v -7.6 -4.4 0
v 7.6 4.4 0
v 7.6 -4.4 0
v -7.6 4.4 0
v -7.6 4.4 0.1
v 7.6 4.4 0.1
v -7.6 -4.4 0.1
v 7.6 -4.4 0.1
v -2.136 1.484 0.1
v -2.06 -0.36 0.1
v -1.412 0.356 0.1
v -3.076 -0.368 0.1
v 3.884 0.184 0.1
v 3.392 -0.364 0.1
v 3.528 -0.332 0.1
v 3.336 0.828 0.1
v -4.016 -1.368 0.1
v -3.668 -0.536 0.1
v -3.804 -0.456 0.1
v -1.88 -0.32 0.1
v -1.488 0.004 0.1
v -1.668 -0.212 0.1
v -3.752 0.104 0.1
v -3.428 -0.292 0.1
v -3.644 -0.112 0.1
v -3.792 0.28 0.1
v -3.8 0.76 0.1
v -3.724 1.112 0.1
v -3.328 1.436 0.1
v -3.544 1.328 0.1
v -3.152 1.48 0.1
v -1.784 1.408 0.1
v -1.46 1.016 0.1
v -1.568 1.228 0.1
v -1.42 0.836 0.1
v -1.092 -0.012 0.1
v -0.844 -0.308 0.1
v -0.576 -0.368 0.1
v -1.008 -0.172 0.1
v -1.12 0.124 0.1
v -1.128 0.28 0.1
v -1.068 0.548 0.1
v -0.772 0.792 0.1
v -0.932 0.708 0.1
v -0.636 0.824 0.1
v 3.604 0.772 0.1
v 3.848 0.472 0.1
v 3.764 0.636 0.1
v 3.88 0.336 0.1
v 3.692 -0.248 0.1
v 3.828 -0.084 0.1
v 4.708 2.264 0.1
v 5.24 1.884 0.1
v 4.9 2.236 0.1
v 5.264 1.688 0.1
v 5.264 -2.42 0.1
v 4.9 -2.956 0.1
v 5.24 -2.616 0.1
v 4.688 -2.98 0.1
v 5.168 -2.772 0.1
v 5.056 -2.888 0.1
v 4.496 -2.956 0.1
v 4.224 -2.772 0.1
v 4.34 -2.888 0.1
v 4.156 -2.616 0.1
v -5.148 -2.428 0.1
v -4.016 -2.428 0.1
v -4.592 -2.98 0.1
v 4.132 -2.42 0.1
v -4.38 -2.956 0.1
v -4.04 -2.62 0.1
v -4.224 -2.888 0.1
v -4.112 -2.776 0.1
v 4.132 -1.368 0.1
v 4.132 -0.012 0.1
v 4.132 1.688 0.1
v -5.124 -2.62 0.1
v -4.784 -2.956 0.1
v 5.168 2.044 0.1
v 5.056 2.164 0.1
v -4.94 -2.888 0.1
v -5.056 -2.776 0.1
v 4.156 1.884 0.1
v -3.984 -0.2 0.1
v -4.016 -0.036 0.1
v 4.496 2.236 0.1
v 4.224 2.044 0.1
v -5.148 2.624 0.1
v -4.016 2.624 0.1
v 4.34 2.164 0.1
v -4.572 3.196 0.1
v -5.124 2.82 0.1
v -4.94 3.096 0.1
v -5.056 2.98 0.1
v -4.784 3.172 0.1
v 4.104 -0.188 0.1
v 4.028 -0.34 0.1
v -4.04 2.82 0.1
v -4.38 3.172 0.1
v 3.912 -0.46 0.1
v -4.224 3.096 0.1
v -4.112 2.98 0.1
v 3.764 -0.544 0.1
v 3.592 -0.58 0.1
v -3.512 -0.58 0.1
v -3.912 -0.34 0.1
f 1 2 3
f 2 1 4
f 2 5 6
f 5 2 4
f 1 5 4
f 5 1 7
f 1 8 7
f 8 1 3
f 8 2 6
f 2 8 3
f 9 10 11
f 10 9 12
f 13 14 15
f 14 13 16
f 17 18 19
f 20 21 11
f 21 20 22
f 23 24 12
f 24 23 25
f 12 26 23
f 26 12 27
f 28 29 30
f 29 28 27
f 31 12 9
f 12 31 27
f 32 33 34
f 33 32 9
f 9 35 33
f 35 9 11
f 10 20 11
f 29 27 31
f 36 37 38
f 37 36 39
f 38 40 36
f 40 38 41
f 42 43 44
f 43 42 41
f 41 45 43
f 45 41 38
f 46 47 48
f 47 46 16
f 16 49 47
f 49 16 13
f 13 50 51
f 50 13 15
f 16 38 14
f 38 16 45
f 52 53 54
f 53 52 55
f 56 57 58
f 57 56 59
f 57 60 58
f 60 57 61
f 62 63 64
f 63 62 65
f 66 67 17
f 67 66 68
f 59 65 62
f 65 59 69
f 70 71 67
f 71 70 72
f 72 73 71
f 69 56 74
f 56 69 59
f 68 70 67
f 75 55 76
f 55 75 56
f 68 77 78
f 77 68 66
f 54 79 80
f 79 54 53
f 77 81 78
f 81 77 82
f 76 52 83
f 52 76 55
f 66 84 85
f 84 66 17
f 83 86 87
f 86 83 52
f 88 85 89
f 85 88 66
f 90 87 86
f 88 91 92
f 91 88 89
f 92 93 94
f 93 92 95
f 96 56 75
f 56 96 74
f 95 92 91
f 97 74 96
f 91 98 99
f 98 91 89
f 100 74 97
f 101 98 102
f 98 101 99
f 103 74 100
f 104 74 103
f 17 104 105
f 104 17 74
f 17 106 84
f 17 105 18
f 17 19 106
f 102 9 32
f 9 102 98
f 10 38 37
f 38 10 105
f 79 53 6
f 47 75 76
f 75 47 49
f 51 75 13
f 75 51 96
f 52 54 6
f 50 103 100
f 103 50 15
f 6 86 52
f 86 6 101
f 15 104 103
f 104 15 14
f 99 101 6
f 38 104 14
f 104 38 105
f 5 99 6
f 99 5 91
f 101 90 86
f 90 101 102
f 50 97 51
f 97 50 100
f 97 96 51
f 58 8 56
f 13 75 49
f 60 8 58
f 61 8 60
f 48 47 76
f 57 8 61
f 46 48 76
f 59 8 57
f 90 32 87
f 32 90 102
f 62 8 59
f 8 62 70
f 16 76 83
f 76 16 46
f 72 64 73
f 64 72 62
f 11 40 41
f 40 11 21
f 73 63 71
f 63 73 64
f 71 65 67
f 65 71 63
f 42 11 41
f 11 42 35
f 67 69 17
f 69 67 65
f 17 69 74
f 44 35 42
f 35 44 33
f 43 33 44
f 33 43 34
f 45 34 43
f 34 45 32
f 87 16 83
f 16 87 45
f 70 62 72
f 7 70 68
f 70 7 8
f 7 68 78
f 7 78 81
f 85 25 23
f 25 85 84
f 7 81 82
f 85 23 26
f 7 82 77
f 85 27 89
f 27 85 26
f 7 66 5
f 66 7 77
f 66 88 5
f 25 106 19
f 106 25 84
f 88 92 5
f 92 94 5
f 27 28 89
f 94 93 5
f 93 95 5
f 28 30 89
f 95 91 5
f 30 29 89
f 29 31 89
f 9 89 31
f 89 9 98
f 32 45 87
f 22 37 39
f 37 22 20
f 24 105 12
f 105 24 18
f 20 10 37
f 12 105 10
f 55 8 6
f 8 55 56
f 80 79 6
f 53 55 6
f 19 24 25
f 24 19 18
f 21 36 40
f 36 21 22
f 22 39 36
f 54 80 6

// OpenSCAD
// file: ../p/box5-12.scad
use <../lib.scad>
function ldraw_lib__box5_12() = [
// 0 Box with 5 Faces without Any Edges
// 0 Name: box5-12.dat
// 0 Author: Chris Dee [cwdee]
// 0 !LDRAW_ORG Primitive UPDATE 2009-02
// 0 !LICENSE Licensed under CC BY 2.0 and CC BY 4.0 : see CAreadme.txt
// 
// 0 BFC CERTIFY CCW
  [0,"BFC","CERTIFY"],
  [0,"BFC","CCW"],
// 
// 0 !HISTORY 2009-09-03 [PTadmin] Official Update 2009-02
// 
// 
// 4 16 1 1 1 1 1 -1 -1 1 -1 -1 1 1
  [4,16,1,1,1,1,1,-1,-1,1,-1,-1,1,1],
// 4 16 -1 0 1 1 0 1 1 1 1 -1 1 1
  [4,16,-1,0,1,1,0,1,1,1,1,-1,1,1],
// 4 16 -1 0 -1 -1 0 1 -1 1 1 -1 1 -1
  [4,16,-1,0,-1,-1,0,1,-1,1,1,-1,1,-1],
// 4 16 1 0 -1 -1 0 -1 -1 1 -1 1 1 -1
  [4,16,1,0,-1,-1,0,-1,-1,1,-1,1,1,-1],
// 4 16 1 0 1 1 0 -1 1 1 -1 1 1 1
  [4,16,1,0,1,1,0,-1,1,1,-1,1,1,1],
// 0
];
module ldraw_lib__box5_12(step=0, col=false, unit=2/5, alt=false, line=0.2, solid=!$preview)
    makepoly(ldraw_lib__box5_12(), step=step, col=col, unit=unit, alt=alt, line=line, solid=solid);
ldraw_lib__box5_12(line=0.2);
// main file
use <../lib.scad>
use <../p/box5-12.scad>
function ldraw_lib__164565c() = [
// 0 Sticker  1.1 x  1.9 with Blue Bed Icon
// 0 Name: 164565c.dat
// 0 Author: Zoltan Keri [kzoltan82]
// 0 !LDRAW_ORG Part UPDATE 2018-02
// 0 !LICENSE Licensed under CC BY 2.0 and CC BY 4.0 : see CAreadme.txt
// 
// 0 BFC CERTIFY CCW
  [0,"BFC","CERTIFY"],
  [0,"BFC","CCW"],
// 
// 0 !KEYWORDS Hotel, Metroliner, Motel, Set 4558, Train
// 
// 0 !HISTORY 2018-12-08 [PTadmin] Official Update 2018-02
// 
// 
// 1 16 0 -0.25 0 19 0 0 0 0.25 0 0 0 11 box5-12.dat
  [1,16,0,-0.25,0,19,0,0,0,0.25,0,0,0,11, ldraw_lib__box5_12()],
// 4 1 -7.69 -0.25 -0.92 -5.15 -0.25 -0.9 -3.53 -0.25 0.89 -5.34 -0.25 3.71
  [4,1,-7.69,-0.25,-0.92,-5.15,-0.25,-0.9,-3.53,-0.25,0.89,-5.34,-0.25,3.71],
// 4 1 8.82 -0.25 -0.83 9.71 -0.25 0.46 8.34 -0.25 2.07 8.48 -0.25 -0.91
  [4,1,8.82,-0.25,-0.83,9.71,-0.25,0.46,8.34,-0.25,2.07,8.48,-0.25,-0.91],
// 3 1 -10.04 -0.25 -3.42 -9.17 -0.25 -1.34 -9.51 -0.25 -1.14
  [3,1,-10.04,-0.25,-3.42,-9.17,-0.25,-1.34,-9.51,-0.25,-1.14],
// 4 1 -4.17 -0.25 -0.53 -3.72 -0.25 0.01 -3.53 -0.25 0.89 -4.7 -0.25 -0.8
  [4,1,-4.17,-0.25,-0.53,-3.72,-0.25,0.01,-3.53,-0.25,0.89,-4.7,-0.25,-0.8],
// 4 1 -7.69 -0.25 -0.92 -9.38 -0.25 0.26 -9.11 -0.25 -0.28 -8.57 -0.25 -0.73
  [4,1,-7.69,-0.25,-0.92,-9.38,-0.25,0.26,-9.11,-0.25,-0.28,-8.57,-0.25,-0.73],
// 4 1 -9.5 -0.25 1.9 -9.48 -0.25 0.7 -9.38 -0.25 0.26 -7.69 -0.25 -0.92
  [4,1,-9.5,-0.25,1.9,-9.48,-0.25,0.7,-9.38,-0.25,0.26,-7.69,-0.25,-0.92],
// 4 1 -8.86 -0.25 3.32 -9.31 -0.25 2.78 -9.5 -0.25 1.9 -8.32 -0.25 3.59
  [4,1,-8.86,-0.25,3.32,-9.31,-0.25,2.78,-9.5,-0.25,1.9,-8.32,-0.25,3.59],
// 4 1 -9.5 -0.25 1.9 -7.69 -0.25 -0.92 -5.34 -0.25 3.71 -7.88 -0.25 3.7
  [4,1,-9.5,-0.25,1.9,-7.69,-0.25,-0.92,-5.34,-0.25,3.71,-7.88,-0.25,3.7],
// 4 1 -5.34 -0.25 3.71 -3.65 -0.25 2.54 -3.92 -0.25 3.07 -4.46 -0.25 3.52
  [4,1,-5.34,-0.25,3.71,-3.65,-0.25,2.54,-3.92,-0.25,3.07,-4.46,-0.25,3.52],
// 4 1 -3.53 -0.25 0.89 -3.55 -0.25 2.09 -3.65 -0.25 2.54 -5.34 -0.25 3.71
  [4,1,-3.53,-0.25,0.89,-3.55,-0.25,2.09,-3.65,-0.25,2.54,-5.34,-0.25,3.71],
// 3 1 -5.15 -0.25 -0.9 -4.7 -0.25 -0.8 -3.53 -0.25 0.89
  [3,1,-5.15,-0.25,-0.9,-4.7,-0.25,-0.8,-3.53,-0.25,0.89],
// 3 1 -8.32 -0.25 3.59 -9.5 -0.25 1.9 -7.88 -0.25 3.7
  [3,1,-8.32,-0.25,3.59,-9.5,-0.25,1.9,-7.88,-0.25,3.7],
// 4 1 -2.52 -0.25 -0.43 -2.11 -0.25 -0.77 -1.44 -0.25 -0.92 -2.73 -0.25 -0.03
  [4,1,-2.52,-0.25,-0.43,-2.11,-0.25,-0.77,-1.44,-0.25,-0.92,-2.73,-0.25,-0.03],
// 4 1 -2.73 -0.25 -0.03 -1.44 -0.25 -0.92 -2.82 -0.25 0.7 -2.8 -0.25 0.31
  [4,1,-2.73,-0.25,-0.03,-1.44,-0.25,-0.92,-2.82,-0.25,0.7,-2.8,-0.25,0.31],
// 4 1 -2.82 -0.25 0.7 -1.93 -0.25 1.98 -2.33 -0.25 1.77 -2.67 -0.25 1.37
  [4,1,-2.82,-0.25,0.7,-1.93,-0.25,1.98,-2.33,-0.25,1.77,-2.67,-0.25,1.37],
// 4 1 -1.44 -0.25 -0.92 -1.59 -0.25 2.06 -1.93 -0.25 1.98 -2.82 -0.25 0.7
  [4,1,-1.44,-0.25,-0.92,-1.59,-0.25,2.06,-1.93,-0.25,1.98,-2.82,-0.25,0.7],
// 4 1 9.41 -0.25 1.59 9.01 -0.25 1.93 8.34 -0.25 2.07 9.62 -0.25 1.18
  [4,1,9.41,-0.25,1.59,9.01,-0.25,1.93,8.34,-0.25,2.07,9.62,-0.25,1.18],
// 4 1 9.62 -0.25 1.18 8.34 -0.25 2.07 9.71 -0.25 0.46 9.7 -0.25 0.84
  [4,1,9.62,-0.25,1.18,8.34,-0.25,2.07,9.71,-0.25,0.46,9.7,-0.25,0.84],
// 4 1 9.71 -0.25 0.46 8.82 -0.25 -0.83 9.23 -0.25 -0.62 9.57 -0.25 -0.21
  [4,1,9.71,-0.25,0.46,8.82,-0.25,-0.83,9.23,-0.25,-0.62,9.57,-0.25,-0.21],
// 4 1 -1.59 -0.25 2.06 -1.44 -0.25 -0.92 8.48 -0.25 -0.91 8.34 -0.25 2.07
  [4,1,-1.59,-0.25,2.06,-1.44,-0.25,-0.92,8.48,-0.25,-0.91,8.34,-0.25,2.07],
// 4 1 12.25 -0.25 5.59 11.77 -0.25 5.66 13.16 -0.25 4.22 13.1 -0.25 4.71
  [4,1,12.25,-0.25,5.59,11.77,-0.25,5.66,13.16,-0.25,4.22,13.1,-0.25,4.71],
// 4 1 11.72 -0.25 -7.45 12.25 -0.25 -7.39 13.1 -0.25 -6.54 13.16 -0.25 -6.05
  [4,1,11.72,-0.25,-7.45,12.25,-0.25,-7.39,13.1,-0.25,-6.54,13.16,-0.25,-6.05],
// 4 1 13.1 -0.25 -6.54 12.25 -0.25 -7.39 12.64 -0.25 -7.22 12.92 -0.25 -6.93
  [4,1,13.1,-0.25,-6.54,12.25,-0.25,-7.39,12.64,-0.25,-7.22,12.92,-0.25,-6.93],
// 4 1 10.39 -0.25 -6.54 10.56 -0.25 -6.93 10.85 -0.25 -7.22 11.24 -0.25 -7.39
  [4,1,10.39,-0.25,-6.54,10.56,-0.25,-6.93,10.85,-0.25,-7.22,11.24,-0.25,-7.39],
// 4 1 -11.48 -0.25 -7.45 -10.04 -0.25 -6.07 -10.04 -0.25 -3.42 -12.87 -0.25 -6.07
  [4,1,-11.48,-0.25,-7.45,-10.04,-0.25,-6.07,-10.04,-0.25,-3.42,-12.87,-0.25,-6.07],
// 4 1 10.33 -0.25 -6.05 10.39 -0.25 -6.54 11.24 -0.25 -7.39 11.72 -0.25 -7.45
  [4,1,10.33,-0.25,-6.05,10.39,-0.25,-6.54,11.24,-0.25,-7.39,11.72,-0.25,-7.45],
// 4 1 -10.56 -0.25 -7.22 -10.1 -0.25 -6.55 -10.04 -0.25 -6.07 -10.95 -0.25 -7.39
  [4,1,-10.56,-0.25,-7.22,-10.1,-0.25,-6.55,-10.04,-0.25,-6.07,-10.95,-0.25,-7.39],
// 3 1 -10.56 -0.25 -7.22 -10.28 -0.25 -6.94 -10.1 -0.25 -6.55
  [3,1,-10.56,-0.25,-7.22,-10.28,-0.25,-6.94,-10.1,-0.25,-6.55],
// 4 1 10.33 -0.25 -3.42 10.33 -0.25 -6.05 11.72 -0.25 -7.45 13.16 -0.25 -6.05
  [4,1,10.33,-0.25,-3.42,10.33,-0.25,-6.05,11.72,-0.25,-7.45,13.16,-0.25,-6.05],
// 3 1 -11.48 -0.25 -7.45 -10.95 -0.25 -7.39 -10.04 -0.25 -6.07
  [3,1,-11.48,-0.25,-7.45,-10.95,-0.25,-7.39,-10.04,-0.25,-6.07],
// 4 1 10.33 -0.25 4.22 10.33 -0.25 -0.03 13.16 -0.25 -6.05 13.16 -0.25 4.22
  [4,1,10.33,-0.25,4.22,10.33,-0.25,-0.03,13.16,-0.25,-6.05,13.16,-0.25,4.22],
// 4 1 -12.81 -0.25 -6.55 -11.96 -0.25 -7.39 -11.48 -0.25 -7.45 -12.87 -0.25 -6.07
  [4,1,-12.81,-0.25,-6.55,-11.96,-0.25,-7.39,-11.48,-0.25,-7.45,-12.87,-0.25,-6.07],
// 4 1 12.64 -0.25 5.41 12.25 -0.25 5.59 13.1 -0.25 4.71 12.92 -0.25 5.11
  [4,1,12.64,-0.25,5.41,12.25,-0.25,5.59,13.1,-0.25,4.71,12.92,-0.25,5.11],
// 4 1 -12.64 -0.25 -6.94 -12.35 -0.25 -7.22 -11.96 -0.25 -7.39 -12.81 -0.25 -6.55
  [4,1,-12.64,-0.25,-6.94,-12.35,-0.25,-7.22,-11.96,-0.25,-7.39,-12.81,-0.25,-6.55],
// 4 1 10.39 -0.25 4.71 10.33 -0.25 4.22 13.16 -0.25 4.22 11.77 -0.25 5.66
  [4,1,10.39,-0.25,4.71,10.33,-0.25,4.22,13.16,-0.25,4.22,11.77,-0.25,5.66],
// 4 1 -10.04 -0.25 -0.09 -12.87 -0.25 -6.07 -10.04 -0.25 -3.42 -9.96 -0.25 -0.5
  [4,1,-10.04,-0.25,-0.09,-12.87,-0.25,-6.07,-10.04,-0.25,-3.42,-9.96,-0.25,-0.5],
// 4 1 10.56 -0.25 5.11 10.39 -0.25 4.71 11.77 -0.25 5.66 11.24 -0.25 5.59
  [4,1,10.56,-0.25,5.11,10.39,-0.25,4.71,11.77,-0.25,5.66,11.24,-0.25,5.59],
// 4 1 -10.04 -0.25 6.56 -12.87 -0.25 6.56 -12.87 -0.25 -6.07 -10.04 -0.25 -0.09
  [4,1,-10.04,-0.25,6.56,-12.87,-0.25,6.56,-12.87,-0.25,-6.07,-10.04,-0.25,-0.09],
// 3 1 10.85 -0.25 5.41 10.56 -0.25 5.11 11.24 -0.25 5.59
  [3,1,10.85,-0.25,5.41,10.56,-0.25,5.11,11.24,-0.25,5.59],
// 4 1 -12.81 -0.25 7.05 -12.87 -0.25 6.56 -10.04 -0.25 6.56 -11.43 -0.25 7.99
  [4,1,-12.81,-0.25,7.05,-12.87,-0.25,6.56,-10.04,-0.25,6.56,-11.43,-0.25,7.99],
// 4 1 -12.35 -0.25 7.74 -12.64 -0.25 7.45 -12.81 -0.25 7.05 -11.96 -0.25 7.93
  [4,1,-12.35,-0.25,7.74,-12.64,-0.25,7.45,-12.81,-0.25,7.05,-11.96,-0.25,7.93],
// 4 1 10.33 -0.25 -3.42 13.16 -0.25 -6.05 10.33 -0.25 -0.03 10.26 -0.25 -0.47
  [4,1,10.33,-0.25,-3.42,13.16,-0.25,-6.05,10.33,-0.25,-0.03,10.26,-0.25,-0.47],
// 3 1 -11.96 -0.25 7.93 -12.81 -0.25 7.05 -11.43 -0.25 7.99
  [3,1,-11.96,-0.25,7.93,-12.81,-0.25,7.05,-11.43,-0.25,7.99],
// 3 1 10.07 -0.25 -0.85 10.33 -0.25 -3.42 10.26 -0.25 -0.47
  [3,1,10.07,-0.25,-0.85,10.33,-0.25,-3.42,10.26,-0.25,-0.47],
// 4 1 -10.95 -0.25 7.93 -11.43 -0.25 7.99 -10.04 -0.25 6.56 -10.1 -0.25 7.05
  [4,1,-10.95,-0.25,7.93,-11.43,-0.25,7.99,-10.04,-0.25,6.56,-10.1,-0.25,7.05],
// 3 1 9.78 -0.25 -1.15 10.33 -0.25 -3.42 10.07 -0.25 -0.85
  [3,1,9.78,-0.25,-1.15,10.33,-0.25,-3.42,10.07,-0.25,-0.85],
// 4 1 -10.1 -0.25 7.05 -10.28 -0.25 7.45 -10.56 -0.25 7.74 -10.95 -0.25 7.93
  [4,1,-10.1,-0.25,7.05,-10.28,-0.25,7.45,-10.56,-0.25,7.74,-10.95,-0.25,7.93],
// 3 1 9.41 -0.25 -1.36 10.33 -0.25 -3.42 9.78 -0.25 -1.15
  [3,1,9.41,-0.25,-1.36,10.33,-0.25,-3.42,9.78,-0.25,-1.15],
// 3 1 8.98 -0.25 -1.45 10.33 -0.25 -3.42 9.41 -0.25 -1.36
  [3,1,8.98,-0.25,-1.45,10.33,-0.25,-3.42,9.41,-0.25,-1.36],
// 4 1 -8.78 -0.25 -1.45 -10.04 -0.25 -3.42 10.33 -0.25 -3.42 8.98 -0.25 -1.45
  [4,1,-8.78,-0.25,-1.45,-10.04,-0.25,-3.42,10.33,-0.25,-3.42,8.98,-0.25,-1.45],
// 3 1 -10.04 -0.25 -3.42 -9.78 -0.25 -0.85 -9.96 -0.25 -0.5
  [3,1,-10.04,-0.25,-3.42,-9.78,-0.25,-0.85,-9.96,-0.25,-0.5],
// 3 1 -10.04 -0.25 -3.42 -8.78 -0.25 -1.45 -9.17 -0.25 -1.34
  [3,1,-10.04,-0.25,-3.42,-8.78,-0.25,-1.45,-9.17,-0.25,-1.34],
// 3 1 -10.04 -0.25 -3.42 -9.51 -0.25 -1.14 -9.78 -0.25 -0.85
  [3,1,-10.04,-0.25,-3.42,-9.51,-0.25,-1.14,-9.78,-0.25,-0.85],
// 4 16 -4.46 -0.25 3.52 -10.28 -0.25 7.45 -10.1 -0.25 7.05 -5.34 -0.25 3.71
  [4,16,-4.46,-0.25,3.52,-10.28,-0.25,7.45,-10.1,-0.25,7.05,-5.34,-0.25,3.71],
// 4 16 -2.11 -0.25 -0.77 -5.15 -0.25 -0.9 -8.78 -0.25 -1.45 -1.44 -0.25 -0.92
  [4,16,-2.11,-0.25,-0.77,-5.15,-0.25,-0.9,-8.78,-0.25,-1.45,-1.44,-0.25,-0.92],
// 3 16 12.92 -0.25 5.11 13.1 -0.25 4.71 19 -0.25 11
  [3,16,12.92,-0.25,5.11,13.1,-0.25,4.71,19,-0.25,11],
// 4 16 9.7 -0.25 0.84 10.33 -0.25 -0.03 10.33 -0.25 4.22 9.62 -0.25 1.18
  [4,16,9.7,-0.25,0.84,10.33,-0.25,-0.03,10.33,-0.25,4.22,9.62,-0.25,1.18],
// 4 16 10.26 -0.25 -0.47 10.33 -0.25 -0.03 9.71 -0.25 0.46 9.57 -0.25 -0.21
  [4,16,10.26,-0.25,-0.47,10.33,-0.25,-0.03,9.71,-0.25,0.46,9.57,-0.25,-0.21],
// 3 16 11.77 -0.25 5.66 12.25 -0.25 5.59 19 -0.25 11
  [3,16,11.77,-0.25,5.66,12.25,-0.25,5.59,19,-0.25,11],
// 4 16 8.82 -0.25 -0.83 9.41 -0.25 -1.36 9.78 -0.25 -1.15 9.23 -0.25 -0.62
  [4,16,8.82,-0.25,-0.83,9.41,-0.25,-1.36,9.78,-0.25,-1.15,9.23,-0.25,-0.62],
// 4 16 -10.56 -0.25 7.74 11.24 -0.25 5.59 11.77 -0.25 5.66 19 -0.25 11
  [4,16,-10.56,-0.25,7.74,11.24,-0.25,5.59,11.77,-0.25,5.66,19,-0.25,11],
// 4 16 8.48 -0.25 -0.91 8.98 -0.25 -1.45 9.41 -0.25 -1.36 8.82 -0.25 -0.83
  [4,16,8.48,-0.25,-0.91,8.98,-0.25,-1.45,9.41,-0.25,-1.36,8.82,-0.25,-0.83],
// 3 16 -10.95 -0.25 7.93 -10.56 -0.25 7.74 19 -0.25 11
  [3,16,-10.95,-0.25,7.93,-10.56,-0.25,7.74,19,-0.25,11],
// 4 16 -1.44 -0.25 -0.92 -8.78 -0.25 -1.45 8.98 -0.25 -1.45 8.48 -0.25 -0.91
  [4,16,-1.44,-0.25,-0.92,-8.78,-0.25,-1.45,8.98,-0.25,-1.45,8.48,-0.25,-0.91],
// 4 16 -11.43 -0.25 7.99 -10.95 -0.25 7.93 19 -0.25 11 -19 -0.25 11
  [4,16,-11.43,-0.25,7.99,-10.95,-0.25,7.93,19,-0.25,11,-19,-0.25,11],
// 4 16 -10.28 -0.25 7.45 10.85 -0.25 5.41 11.24 -0.25 5.59 -10.56 -0.25 7.74
  [4,16,-10.28,-0.25,7.45,10.85,-0.25,5.41,11.24,-0.25,5.59,-10.56,-0.25,7.74],
// 4 16 9.57 -0.25 -0.21 9.23 -0.25 -0.62 9.78 -0.25 -1.15 10.07 -0.25 -0.85
  [4,16,9.57,-0.25,-0.21,9.23,-0.25,-0.62,9.78,-0.25,-1.15,10.07,-0.25,-0.85],
// 3 16 10.07 -0.25 -0.85 10.26 -0.25 -0.47 9.57 -0.25 -0.21
  [3,16,10.07,-0.25,-0.85,10.26,-0.25,-0.47,9.57,-0.25,-0.21],
// 3 16 13.1 -0.25 -6.54 19 -0.25 -11 13.16 -0.25 -6.05
  [3,16,13.1,-0.25,-6.54,19,-0.25,-11,13.16,-0.25,-6.05],
// 3 16 9.71 -0.25 0.46 10.33 -0.25 -0.03 9.7 -0.25 0.84
  [3,16,9.71,-0.25,0.46,10.33,-0.25,-0.03,9.7,-0.25,0.84],
// 3 16 12.92 -0.25 -6.93 19 -0.25 -11 13.1 -0.25 -6.54
  [3,16,12.92,-0.25,-6.93,19,-0.25,-11,13.1,-0.25,-6.54],
// 3 16 12.64 -0.25 -7.22 19 -0.25 -11 12.92 -0.25 -6.93
  [3,16,12.64,-0.25,-7.22,19,-0.25,-11,12.92,-0.25,-6.93],
// 3 16 9.41 -0.25 1.59 9.62 -0.25 1.18 10.33 -0.25 4.22
  [3,16,9.41,-0.25,1.59,9.62,-0.25,1.18,10.33,-0.25,4.22],
// 3 16 12.25 -0.25 -7.39 19 -0.25 -11 12.64 -0.25 -7.22
  [3,16,12.25,-0.25,-7.39,19,-0.25,-11,12.64,-0.25,-7.22],
// 3 16 9.01 -0.25 1.93 9.41 -0.25 1.59 10.33 -0.25 4.22
  [3,16,9.01,-0.25,1.93,9.41,-0.25,1.59,10.33,-0.25,4.22],
// 3 16 11.72 -0.25 -7.45 19 -0.25 -11 12.25 -0.25 -7.39
  [3,16,11.72,-0.25,-7.45,19,-0.25,-11,12.25,-0.25,-7.39],
// 4 16 10.56 -0.25 5.11 10.85 -0.25 5.41 -10.28 -0.25 7.45 -4.46 -0.25 3.52
  [4,16,10.56,-0.25,5.11,10.85,-0.25,5.41,-10.28,-0.25,7.45,-4.46,-0.25,3.52],
// 4 16 -10.95 -0.25 -7.39 19 -0.25 -11 11.72 -0.25 -7.45 11.24 -0.25 -7.39
  [4,16,-10.95,-0.25,-7.39,19,-0.25,-11,11.72,-0.25,-7.45,11.24,-0.25,-7.39],
// 4 16 10.39 -0.25 4.71 8.34 -0.25 2.07 9.01 -0.25 1.93 10.33 -0.25 4.22
  [4,16,10.39,-0.25,4.71,8.34,-0.25,2.07,9.01,-0.25,1.93,10.33,-0.25,4.22],
// 4 16 -10.28 -0.25 -6.94 -10.56 -0.25 -7.22 11.24 -0.25 -7.39 10.85 -0.25 -7.22
  [4,16,-10.28,-0.25,-6.94,-10.56,-0.25,-7.22,11.24,-0.25,-7.39,10.85,-0.25,-7.22],
// 4 16 -3.72 -0.25 0.01 -2.8 -0.25 0.31 -2.82 -0.25 0.7 -3.53 -0.25 0.89
  [4,16,-3.72,-0.25,0.01,-2.8,-0.25,0.31,-2.82,-0.25,0.7,-3.53,-0.25,0.89],
// 4 16 -10.1 -0.25 -6.55 -10.28 -0.25 -6.94 10.85 -0.25 -7.22 10.56 -0.25 -6.93
  [4,16,-10.1,-0.25,-6.55,-10.28,-0.25,-6.94,10.85,-0.25,-7.22,10.56,-0.25,-6.93],
// 4 16 -10.04 -0.25 -6.07 -10.1 -0.25 -6.55 10.56 -0.25 -6.93 10.39 -0.25 -6.54
  [4,16,-10.04,-0.25,-6.07,-10.1,-0.25,-6.55,10.56,-0.25,-6.93,10.39,-0.25,-6.54],
// 4 16 -3.55 -0.25 2.09 -3.53 -0.25 0.89 -2.82 -0.25 0.7 -2.67 -0.25 1.37
  [4,16,-3.55,-0.25,2.09,-3.53,-0.25,0.89,-2.82,-0.25,0.7,-2.67,-0.25,1.37],
// 4 16 -10.04 -0.25 -3.42 -10.04 -0.25 -6.07 10.39 -0.25 -6.54 10.33 -0.25 -6.05
  [4,16,-10.04,-0.25,-3.42,-10.04,-0.25,-6.07,10.39,-0.25,-6.54,10.33,-0.25,-6.05],
// 3 16 -10.04 -0.25 -3.42 10.33 -0.25 -6.05 10.33 -0.25 -3.42
  [3,16,-10.04,-0.25,-3.42,10.33,-0.25,-6.05,10.33,-0.25,-3.42],
// 4 16 -3.65 -0.25 2.54 -3.55 -0.25 2.09 -2.67 -0.25 1.37 -2.33 -0.25 1.77
  [4,16,-3.65,-0.25,2.54,-3.55,-0.25,2.09,-2.67,-0.25,1.37,-2.33,-0.25,1.77],
// 4 16 -3.92 -0.25 3.07 -3.65 -0.25 2.54 -2.33 -0.25 1.77 -1.93 -0.25 1.98
  [4,16,-3.92,-0.25,3.07,-3.65,-0.25,2.54,-2.33,-0.25,1.77,-1.93,-0.25,1.98],
// 4 16 -4.46 -0.25 3.52 -3.92 -0.25 3.07 -1.93 -0.25 1.98 -1.59 -0.25 2.06
  [4,16,-4.46,-0.25,3.52,-3.92,-0.25,3.07,-1.93,-0.25,1.98,-1.59,-0.25,2.06],
// 4 16 10.56 -0.25 5.11 -1.59 -0.25 2.06 8.34 -0.25 2.07 10.39 -0.25 4.71
  [4,16,10.56,-0.25,5.11,-1.59,-0.25,2.06,8.34,-0.25,2.07,10.39,-0.25,4.71],
// 3 16 -10.95 -0.25 -7.39 11.24 -0.25 -7.39 -10.56 -0.25 -7.22
  [3,16,-10.95,-0.25,-7.39,11.24,-0.25,-7.39,-10.56,-0.25,-7.22],
// 4 16 -11.48 -0.25 -7.45 -19 -0.25 -11 19 -0.25 -11 -10.95 -0.25 -7.39
  [4,16,-11.48,-0.25,-7.45,-19,-0.25,-11,19,-0.25,-11,-10.95,-0.25,-7.39],
// 3 16 -19 -0.25 -11 -11.48 -0.25 -7.45 -11.96 -0.25 -7.39
  [3,16,-19,-0.25,-11,-11.48,-0.25,-7.45,-11.96,-0.25,-7.39],
// 3 16 -19 -0.25 -11 -11.96 -0.25 -7.39 -12.35 -0.25 -7.22
  [3,16,-19,-0.25,-11,-11.96,-0.25,-7.39,-12.35,-0.25,-7.22],
// 4 16 -9.96 -0.25 -0.5 -9.11 -0.25 -0.28 -9.38 -0.25 0.26 -10.04 -0.25 -0.09
  [4,16,-9.96,-0.25,-0.5,-9.11,-0.25,-0.28,-9.38,-0.25,0.26,-10.04,-0.25,-0.09],
// 3 16 -19 -0.25 -11 -12.35 -0.25 -7.22 -12.64 -0.25 -6.94
  [3,16,-19,-0.25,-11,-12.35,-0.25,-7.22,-12.64,-0.25,-6.94],
// 3 16 -10.04 -0.25 -0.09 -9.38 -0.25 0.26 -9.48 -0.25 0.7
  [3,16,-10.04,-0.25,-0.09,-9.38,-0.25,0.26,-9.48,-0.25,0.7],
// 3 16 -19 -0.25 -11 -12.64 -0.25 -6.94 -12.81 -0.25 -6.55
  [3,16,-19,-0.25,-11,-12.64,-0.25,-6.94,-12.81,-0.25,-6.55],
// 4 16 -10.04 -0.25 6.56 -10.04 -0.25 -0.09 -9.48 -0.25 0.7 -9.5 -0.25 1.9
  [4,16,-10.04,-0.25,6.56,-10.04,-0.25,-0.09,-9.48,-0.25,0.7,-9.5,-0.25,1.9],
// 4 16 -19 -0.25 11 -19 -0.25 -11 -12.81 -0.25 -6.55 -12.87 -0.25 -6.07
  [4,16,-19,-0.25,11,-19,-0.25,-11,-12.81,-0.25,-6.55,-12.87,-0.25,-6.07],
// 3 16 -12.87 -0.25 -6.07 -12.87 -0.25 6.56 -19 -0.25 11
  [3,16,-12.87,-0.25,-6.07,-12.87,-0.25,6.56,-19,-0.25,11],
// 4 16 -9.96 -0.25 -0.5 -9.78 -0.25 -0.85 -9.51 -0.25 -1.14 -9.11 -0.25 -0.28
  [4,16,-9.96,-0.25,-0.5,-9.78,-0.25,-0.85,-9.51,-0.25,-1.14,-9.11,-0.25,-0.28],
// 3 16 -12.87 -0.25 6.56 -12.81 -0.25 7.05 -19 -0.25 11
  [3,16,-12.87,-0.25,6.56,-12.81,-0.25,7.05,-19,-0.25,11],
// 3 16 -12.81 -0.25 7.05 -12.64 -0.25 7.45 -19 -0.25 11
  [3,16,-12.81,-0.25,7.05,-12.64,-0.25,7.45,-19,-0.25,11],
// 3 16 -9.5 -0.25 1.9 -9.31 -0.25 2.78 -10.04 -0.25 6.56
  [3,16,-9.5,-0.25,1.9,-9.31,-0.25,2.78,-10.04,-0.25,6.56],
// 3 16 -12.64 -0.25 7.45 -12.35 -0.25 7.74 -19 -0.25 11
  [3,16,-12.64,-0.25,7.45,-12.35,-0.25,7.74,-19,-0.25,11],
// 3 16 -12.35 -0.25 7.74 -11.96 -0.25 7.93 -19 -0.25 11
  [3,16,-12.35,-0.25,7.74,-11.96,-0.25,7.93,-19,-0.25,11],
// 3 16 -9.31 -0.25 2.78 -8.86 -0.25 3.32 -10.04 -0.25 6.56
  [3,16,-9.31,-0.25,2.78,-8.86,-0.25,3.32,-10.04,-0.25,6.56],
// 3 16 -11.96 -0.25 7.93 -11.43 -0.25 7.99 -19 -0.25 11
  [3,16,-11.96,-0.25,7.93,-11.43,-0.25,7.99,-19,-0.25,11],
// 3 16 -8.86 -0.25 3.32 -8.32 -0.25 3.59 -10.04 -0.25 6.56
  [3,16,-8.86,-0.25,3.32,-8.32,-0.25,3.59,-10.04,-0.25,6.56],
// 3 16 -8.32 -0.25 3.59 -7.88 -0.25 3.7 -10.04 -0.25 6.56
  [3,16,-8.32,-0.25,3.59,-7.88,-0.25,3.7,-10.04,-0.25,6.56],
// 4 16 -10.1 -0.25 7.05 -10.04 -0.25 6.56 -7.88 -0.25 3.7 -5.34 -0.25 3.71
  [4,16,-10.1,-0.25,7.05,-10.04,-0.25,6.56,-7.88,-0.25,3.7,-5.34,-0.25,3.71],
// 3 16 -4.46 -0.25 3.52 -1.59 -0.25 2.06 10.56 -0.25 5.11
  [3,16,-4.46,-0.25,3.52,-1.59,-0.25,2.06,10.56,-0.25,5.11],
// 4 16 -2.52 -0.25 -0.43 -4.17 -0.25 -0.53 -4.7 -0.25 -0.8 -2.11 -0.25 -0.77
  [4,16,-2.52,-0.25,-0.43,-4.17,-0.25,-0.53,-4.7,-0.25,-0.8,-2.11,-0.25,-0.77],
// 4 16 -7.69 -0.25 -0.92 -8.57 -0.25 -0.73 -9.17 -0.25 -1.34 -8.78 -0.25 -1.45
  [4,16,-7.69,-0.25,-0.92,-8.57,-0.25,-0.73,-9.17,-0.25,-1.34,-8.78,-0.25,-1.45],
// 3 16 -4.7 -0.25 -0.8 -5.15 -0.25 -0.9 -2.11 -0.25 -0.77
  [3,16,-4.7,-0.25,-0.8,-5.15,-0.25,-0.9,-2.11,-0.25,-0.77],
// 3 16 -7.69 -0.25 -0.92 -8.78 -0.25 -1.45 -5.15 -0.25 -0.9
  [3,16,-7.69,-0.25,-0.92,-8.78,-0.25,-1.45,-5.15,-0.25,-0.9],
// 4 16 19 -0.25 11 13.16 -0.25 4.22 13.16 -0.25 -6.05 19 -0.25 -11
  [4,16,19,-0.25,11,13.16,-0.25,4.22,13.16,-0.25,-6.05,19,-0.25,-11],
// 3 16 12.64 -0.25 5.41 12.92 -0.25 5.11 19 -0.25 11
  [3,16,12.64,-0.25,5.41,12.92,-0.25,5.11,19,-0.25,11],
// 3 16 13.1 -0.25 4.71 13.16 -0.25 4.22 19 -0.25 11
  [3,16,13.1,-0.25,4.71,13.16,-0.25,4.22,19,-0.25,11],
// 4 16 -9.51 -0.25 -1.14 -9.17 -0.25 -1.34 -8.57 -0.25 -0.73 -9.11 -0.25 -0.28
  [4,16,-9.51,-0.25,-1.14,-9.17,-0.25,-1.34,-8.57,-0.25,-0.73,-9.11,-0.25,-0.28],
// 4 16 -4.17 -0.25 -0.53 -2.73 -0.25 -0.03 -2.8 -0.25 0.31 -3.72 -0.25 0.01
  [4,16,-4.17,-0.25,-0.53,-2.73,-0.25,-0.03,-2.8,-0.25,0.31,-3.72,-0.25,0.01],
// 3 16 -4.17 -0.25 -0.53 -2.52 -0.25 -0.43 -2.73 -0.25 -0.03
  [3,16,-4.17,-0.25,-0.53,-2.52,-0.25,-0.43,-2.73,-0.25,-0.03],
// 3 16 12.25 -0.25 5.59 12.64 -0.25 5.41 19 -0.25 11
  [3,16,12.25,-0.25,5.59,12.64,-0.25,5.41,19,-0.25,11],
];
module ldraw_lib__164565c(step=0, col=false, unit=2/5, alt=false, line=0.2, solid=!$preview)
    makepoly(ldraw_lib__164565c(), step=step, col=col, unit=unit, alt=alt, line=line, solid=solid);
ldraw_lib__164565c(line=0.2);
